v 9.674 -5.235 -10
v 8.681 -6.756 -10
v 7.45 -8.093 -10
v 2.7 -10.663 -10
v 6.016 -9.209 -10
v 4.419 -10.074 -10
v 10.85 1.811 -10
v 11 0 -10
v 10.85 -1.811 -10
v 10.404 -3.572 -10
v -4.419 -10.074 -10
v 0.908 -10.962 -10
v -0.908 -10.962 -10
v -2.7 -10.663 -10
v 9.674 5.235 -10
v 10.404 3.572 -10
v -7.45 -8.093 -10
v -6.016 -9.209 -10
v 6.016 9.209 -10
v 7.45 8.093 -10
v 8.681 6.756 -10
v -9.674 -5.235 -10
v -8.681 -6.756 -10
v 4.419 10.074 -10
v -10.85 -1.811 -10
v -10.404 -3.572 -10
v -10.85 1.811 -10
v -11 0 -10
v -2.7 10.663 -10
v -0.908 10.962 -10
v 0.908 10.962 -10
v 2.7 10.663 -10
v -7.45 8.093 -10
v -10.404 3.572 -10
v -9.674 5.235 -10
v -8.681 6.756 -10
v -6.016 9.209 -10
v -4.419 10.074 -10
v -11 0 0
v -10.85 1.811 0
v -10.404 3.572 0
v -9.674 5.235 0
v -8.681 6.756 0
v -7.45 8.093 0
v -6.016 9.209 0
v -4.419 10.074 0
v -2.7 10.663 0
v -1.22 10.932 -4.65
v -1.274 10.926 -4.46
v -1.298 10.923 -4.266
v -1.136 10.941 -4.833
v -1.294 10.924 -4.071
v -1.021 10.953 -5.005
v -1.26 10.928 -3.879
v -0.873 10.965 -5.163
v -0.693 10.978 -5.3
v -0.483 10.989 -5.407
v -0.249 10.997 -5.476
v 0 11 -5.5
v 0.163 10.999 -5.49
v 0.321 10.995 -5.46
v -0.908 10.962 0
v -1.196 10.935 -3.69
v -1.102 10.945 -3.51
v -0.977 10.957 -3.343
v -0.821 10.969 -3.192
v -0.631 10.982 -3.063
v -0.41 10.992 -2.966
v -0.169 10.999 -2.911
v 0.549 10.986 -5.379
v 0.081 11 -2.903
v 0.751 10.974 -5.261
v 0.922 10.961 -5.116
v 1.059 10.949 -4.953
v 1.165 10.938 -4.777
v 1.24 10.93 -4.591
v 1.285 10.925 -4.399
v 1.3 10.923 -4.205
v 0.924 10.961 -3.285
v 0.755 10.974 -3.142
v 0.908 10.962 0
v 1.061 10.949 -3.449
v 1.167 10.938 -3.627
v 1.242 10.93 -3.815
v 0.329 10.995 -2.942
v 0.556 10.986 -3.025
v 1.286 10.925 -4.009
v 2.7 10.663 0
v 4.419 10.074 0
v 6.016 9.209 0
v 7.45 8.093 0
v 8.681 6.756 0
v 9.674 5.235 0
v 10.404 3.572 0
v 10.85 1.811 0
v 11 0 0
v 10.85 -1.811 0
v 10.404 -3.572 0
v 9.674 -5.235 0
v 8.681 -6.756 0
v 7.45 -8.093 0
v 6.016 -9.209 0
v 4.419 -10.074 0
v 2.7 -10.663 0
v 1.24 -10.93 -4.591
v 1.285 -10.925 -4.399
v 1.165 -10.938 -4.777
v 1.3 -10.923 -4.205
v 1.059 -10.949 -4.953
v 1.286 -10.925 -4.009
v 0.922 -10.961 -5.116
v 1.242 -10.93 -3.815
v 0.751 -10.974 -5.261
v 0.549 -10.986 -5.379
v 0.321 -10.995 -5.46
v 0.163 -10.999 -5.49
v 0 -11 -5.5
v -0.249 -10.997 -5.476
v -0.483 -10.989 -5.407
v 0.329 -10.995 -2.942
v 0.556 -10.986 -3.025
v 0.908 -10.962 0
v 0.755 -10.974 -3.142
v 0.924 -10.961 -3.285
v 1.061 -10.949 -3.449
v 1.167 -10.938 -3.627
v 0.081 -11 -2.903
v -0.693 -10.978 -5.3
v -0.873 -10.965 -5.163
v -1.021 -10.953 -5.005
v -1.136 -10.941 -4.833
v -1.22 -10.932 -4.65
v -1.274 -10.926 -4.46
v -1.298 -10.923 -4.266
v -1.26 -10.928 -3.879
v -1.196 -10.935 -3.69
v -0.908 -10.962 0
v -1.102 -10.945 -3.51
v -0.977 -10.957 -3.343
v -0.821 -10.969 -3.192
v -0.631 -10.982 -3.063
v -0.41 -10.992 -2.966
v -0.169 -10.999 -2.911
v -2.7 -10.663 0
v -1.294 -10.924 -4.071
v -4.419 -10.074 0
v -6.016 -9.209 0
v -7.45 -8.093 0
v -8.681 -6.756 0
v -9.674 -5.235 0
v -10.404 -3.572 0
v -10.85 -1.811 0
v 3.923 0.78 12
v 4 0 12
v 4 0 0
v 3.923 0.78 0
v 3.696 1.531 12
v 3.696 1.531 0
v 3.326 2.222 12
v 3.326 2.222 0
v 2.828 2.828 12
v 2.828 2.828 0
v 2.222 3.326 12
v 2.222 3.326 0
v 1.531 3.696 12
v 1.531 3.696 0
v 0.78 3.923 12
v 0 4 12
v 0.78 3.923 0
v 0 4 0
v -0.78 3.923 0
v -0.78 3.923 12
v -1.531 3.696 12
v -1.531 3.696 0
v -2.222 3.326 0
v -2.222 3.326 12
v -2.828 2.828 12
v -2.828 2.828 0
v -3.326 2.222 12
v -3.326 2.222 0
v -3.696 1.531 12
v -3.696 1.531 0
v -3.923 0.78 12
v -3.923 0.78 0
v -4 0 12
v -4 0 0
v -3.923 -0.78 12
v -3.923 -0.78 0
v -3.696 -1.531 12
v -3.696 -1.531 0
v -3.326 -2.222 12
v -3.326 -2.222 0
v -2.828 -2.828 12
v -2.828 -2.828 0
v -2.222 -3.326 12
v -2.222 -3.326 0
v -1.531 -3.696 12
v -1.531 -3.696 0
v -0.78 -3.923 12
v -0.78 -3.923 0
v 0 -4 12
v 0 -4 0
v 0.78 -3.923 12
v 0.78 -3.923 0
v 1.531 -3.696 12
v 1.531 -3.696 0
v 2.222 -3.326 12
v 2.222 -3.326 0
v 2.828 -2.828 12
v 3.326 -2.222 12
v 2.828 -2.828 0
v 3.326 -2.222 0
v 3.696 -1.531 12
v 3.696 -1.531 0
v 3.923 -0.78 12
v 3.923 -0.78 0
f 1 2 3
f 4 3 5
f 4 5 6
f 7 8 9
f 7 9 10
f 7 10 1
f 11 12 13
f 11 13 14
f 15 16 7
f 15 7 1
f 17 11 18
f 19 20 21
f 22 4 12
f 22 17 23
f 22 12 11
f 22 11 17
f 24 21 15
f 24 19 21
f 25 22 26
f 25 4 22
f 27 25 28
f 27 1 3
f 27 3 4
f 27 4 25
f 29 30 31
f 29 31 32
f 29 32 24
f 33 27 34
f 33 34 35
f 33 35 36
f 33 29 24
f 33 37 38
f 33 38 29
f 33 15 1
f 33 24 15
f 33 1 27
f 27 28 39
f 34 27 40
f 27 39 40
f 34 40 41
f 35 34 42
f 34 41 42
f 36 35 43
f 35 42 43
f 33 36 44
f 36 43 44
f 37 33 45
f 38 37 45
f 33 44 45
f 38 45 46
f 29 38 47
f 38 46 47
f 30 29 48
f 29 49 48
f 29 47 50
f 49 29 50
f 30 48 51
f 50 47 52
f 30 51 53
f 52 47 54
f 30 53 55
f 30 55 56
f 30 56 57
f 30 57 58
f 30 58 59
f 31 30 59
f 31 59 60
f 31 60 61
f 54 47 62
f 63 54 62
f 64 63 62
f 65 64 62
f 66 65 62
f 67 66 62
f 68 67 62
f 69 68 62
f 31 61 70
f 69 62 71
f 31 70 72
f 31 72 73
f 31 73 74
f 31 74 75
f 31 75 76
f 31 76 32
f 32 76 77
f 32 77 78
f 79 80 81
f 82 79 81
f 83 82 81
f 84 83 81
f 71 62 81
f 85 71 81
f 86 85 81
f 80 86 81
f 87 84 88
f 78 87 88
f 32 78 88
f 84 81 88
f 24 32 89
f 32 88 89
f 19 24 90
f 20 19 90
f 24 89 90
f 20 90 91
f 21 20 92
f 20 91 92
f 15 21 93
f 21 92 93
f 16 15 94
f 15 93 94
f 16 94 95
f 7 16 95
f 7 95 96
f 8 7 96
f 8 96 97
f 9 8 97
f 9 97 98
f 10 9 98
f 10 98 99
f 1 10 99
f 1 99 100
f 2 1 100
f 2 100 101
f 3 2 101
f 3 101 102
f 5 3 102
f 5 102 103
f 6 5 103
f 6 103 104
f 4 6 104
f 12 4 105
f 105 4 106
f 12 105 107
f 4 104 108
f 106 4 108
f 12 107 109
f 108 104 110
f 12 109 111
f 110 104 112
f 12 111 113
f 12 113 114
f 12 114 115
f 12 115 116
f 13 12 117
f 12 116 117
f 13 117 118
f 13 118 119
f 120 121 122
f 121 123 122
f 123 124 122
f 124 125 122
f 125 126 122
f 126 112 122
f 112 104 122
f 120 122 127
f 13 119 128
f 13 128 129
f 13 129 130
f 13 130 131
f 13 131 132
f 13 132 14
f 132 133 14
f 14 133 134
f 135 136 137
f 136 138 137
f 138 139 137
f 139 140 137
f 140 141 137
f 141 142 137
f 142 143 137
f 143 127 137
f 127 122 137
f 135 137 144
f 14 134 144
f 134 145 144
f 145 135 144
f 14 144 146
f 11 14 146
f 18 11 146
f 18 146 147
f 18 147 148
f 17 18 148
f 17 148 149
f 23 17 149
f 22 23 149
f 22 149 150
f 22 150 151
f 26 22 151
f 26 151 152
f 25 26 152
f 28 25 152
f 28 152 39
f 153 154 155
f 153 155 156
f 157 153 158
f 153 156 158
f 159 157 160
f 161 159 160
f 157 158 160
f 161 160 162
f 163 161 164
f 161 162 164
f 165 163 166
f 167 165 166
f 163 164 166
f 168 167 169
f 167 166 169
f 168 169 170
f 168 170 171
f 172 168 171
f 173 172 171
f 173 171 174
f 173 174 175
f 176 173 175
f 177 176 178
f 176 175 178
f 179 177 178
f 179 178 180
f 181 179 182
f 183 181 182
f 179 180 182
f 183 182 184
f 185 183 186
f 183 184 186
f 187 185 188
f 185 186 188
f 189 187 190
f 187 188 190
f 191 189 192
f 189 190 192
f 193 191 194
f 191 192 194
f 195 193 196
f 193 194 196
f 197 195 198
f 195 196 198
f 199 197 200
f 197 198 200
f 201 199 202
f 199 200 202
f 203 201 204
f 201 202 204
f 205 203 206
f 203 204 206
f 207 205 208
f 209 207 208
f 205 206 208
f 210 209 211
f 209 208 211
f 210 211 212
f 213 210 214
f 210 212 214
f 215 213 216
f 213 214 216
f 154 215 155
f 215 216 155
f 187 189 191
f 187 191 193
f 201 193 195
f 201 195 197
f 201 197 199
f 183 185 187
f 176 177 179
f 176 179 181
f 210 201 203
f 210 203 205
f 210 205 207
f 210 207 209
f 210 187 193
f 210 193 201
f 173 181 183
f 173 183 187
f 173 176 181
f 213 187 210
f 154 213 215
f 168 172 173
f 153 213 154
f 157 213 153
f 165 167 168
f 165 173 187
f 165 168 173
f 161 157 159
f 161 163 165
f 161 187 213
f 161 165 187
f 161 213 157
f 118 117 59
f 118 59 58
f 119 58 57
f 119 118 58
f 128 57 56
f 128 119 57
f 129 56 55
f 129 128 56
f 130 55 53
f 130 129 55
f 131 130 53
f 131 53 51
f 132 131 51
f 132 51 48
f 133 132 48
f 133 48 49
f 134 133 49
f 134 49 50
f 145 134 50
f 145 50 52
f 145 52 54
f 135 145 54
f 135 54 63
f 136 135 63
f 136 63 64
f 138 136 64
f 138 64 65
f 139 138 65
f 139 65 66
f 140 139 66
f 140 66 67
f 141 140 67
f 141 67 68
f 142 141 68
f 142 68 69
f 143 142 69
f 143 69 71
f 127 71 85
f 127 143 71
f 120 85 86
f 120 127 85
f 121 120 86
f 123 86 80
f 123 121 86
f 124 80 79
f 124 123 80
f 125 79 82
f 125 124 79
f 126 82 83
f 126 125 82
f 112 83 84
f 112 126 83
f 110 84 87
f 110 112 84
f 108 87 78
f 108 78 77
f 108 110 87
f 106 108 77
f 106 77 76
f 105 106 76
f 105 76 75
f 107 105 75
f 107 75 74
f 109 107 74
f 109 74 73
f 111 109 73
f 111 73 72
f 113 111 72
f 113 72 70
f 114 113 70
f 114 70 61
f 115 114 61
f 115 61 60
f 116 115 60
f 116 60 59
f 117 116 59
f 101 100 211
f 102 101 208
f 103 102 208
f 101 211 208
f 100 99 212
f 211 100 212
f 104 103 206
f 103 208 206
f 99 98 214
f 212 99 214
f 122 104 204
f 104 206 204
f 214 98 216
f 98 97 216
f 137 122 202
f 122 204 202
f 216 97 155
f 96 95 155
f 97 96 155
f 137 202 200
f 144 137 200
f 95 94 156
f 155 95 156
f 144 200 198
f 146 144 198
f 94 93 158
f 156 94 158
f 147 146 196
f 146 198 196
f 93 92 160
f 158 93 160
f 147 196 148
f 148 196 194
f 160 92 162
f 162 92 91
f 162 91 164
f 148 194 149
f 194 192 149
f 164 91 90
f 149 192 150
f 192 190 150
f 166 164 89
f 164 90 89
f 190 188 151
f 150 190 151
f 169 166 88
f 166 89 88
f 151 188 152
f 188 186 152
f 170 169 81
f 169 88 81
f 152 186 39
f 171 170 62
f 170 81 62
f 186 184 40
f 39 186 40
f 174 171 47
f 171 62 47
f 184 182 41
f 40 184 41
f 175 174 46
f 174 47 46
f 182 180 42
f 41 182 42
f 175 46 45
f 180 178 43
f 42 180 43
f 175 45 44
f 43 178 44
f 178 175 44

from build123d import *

# Parameters (mm, degrees)
SKETCH1_R               = 4
BOSS_EXTRUDE1_DEPTH     = 12
SKETCH2_R               = 11
BOSS_EXTRUDE2_DEPTH     = 10
CUT_EXTRUDE1_DEPTH      = 20
CUT_EXTRUDE1_DEPTH_BACK = 20
SKETCH3_R               = 1.3


with BuildPart() as part:
    # Sketch1 → Boss-Extrude1 (new body)
    with BuildSketch(Plane.XY):
        Circle(SKETCH1_R)
    extrude(amount=BOSS_EXTRUDE1_DEPTH)

    # Sketch2 → Boss-Extrude2 (add)
    with BuildSketch(Plane(origin=(0, 0, 0), x_dir=(-1, 0, 0), z_dir=(0, 0, -1))):
        Circle(SKETCH2_R)
    extrude(amount=BOSS_EXTRUDE2_DEPTH)

    # Sketch3 → Cut-Extrude1 (cut, two sides: drawn at the far end of the back side and taken through both)
    with BuildSketch(Plane(origin=(0, 0, 0), x_dir=(1, 0, 0), z_dir=(0, 1, 0)).offset(-CUT_EXTRUDE1_DEPTH_BACK)):
        with Locations((0, 4.2)):
            Circle(SKETCH3_R)
    extrude(amount=CUT_EXTRUDE1_DEPTH + CUT_EXTRUDE1_DEPTH_BACK, mode=Mode.SUBTRACT)


solid = part.part
